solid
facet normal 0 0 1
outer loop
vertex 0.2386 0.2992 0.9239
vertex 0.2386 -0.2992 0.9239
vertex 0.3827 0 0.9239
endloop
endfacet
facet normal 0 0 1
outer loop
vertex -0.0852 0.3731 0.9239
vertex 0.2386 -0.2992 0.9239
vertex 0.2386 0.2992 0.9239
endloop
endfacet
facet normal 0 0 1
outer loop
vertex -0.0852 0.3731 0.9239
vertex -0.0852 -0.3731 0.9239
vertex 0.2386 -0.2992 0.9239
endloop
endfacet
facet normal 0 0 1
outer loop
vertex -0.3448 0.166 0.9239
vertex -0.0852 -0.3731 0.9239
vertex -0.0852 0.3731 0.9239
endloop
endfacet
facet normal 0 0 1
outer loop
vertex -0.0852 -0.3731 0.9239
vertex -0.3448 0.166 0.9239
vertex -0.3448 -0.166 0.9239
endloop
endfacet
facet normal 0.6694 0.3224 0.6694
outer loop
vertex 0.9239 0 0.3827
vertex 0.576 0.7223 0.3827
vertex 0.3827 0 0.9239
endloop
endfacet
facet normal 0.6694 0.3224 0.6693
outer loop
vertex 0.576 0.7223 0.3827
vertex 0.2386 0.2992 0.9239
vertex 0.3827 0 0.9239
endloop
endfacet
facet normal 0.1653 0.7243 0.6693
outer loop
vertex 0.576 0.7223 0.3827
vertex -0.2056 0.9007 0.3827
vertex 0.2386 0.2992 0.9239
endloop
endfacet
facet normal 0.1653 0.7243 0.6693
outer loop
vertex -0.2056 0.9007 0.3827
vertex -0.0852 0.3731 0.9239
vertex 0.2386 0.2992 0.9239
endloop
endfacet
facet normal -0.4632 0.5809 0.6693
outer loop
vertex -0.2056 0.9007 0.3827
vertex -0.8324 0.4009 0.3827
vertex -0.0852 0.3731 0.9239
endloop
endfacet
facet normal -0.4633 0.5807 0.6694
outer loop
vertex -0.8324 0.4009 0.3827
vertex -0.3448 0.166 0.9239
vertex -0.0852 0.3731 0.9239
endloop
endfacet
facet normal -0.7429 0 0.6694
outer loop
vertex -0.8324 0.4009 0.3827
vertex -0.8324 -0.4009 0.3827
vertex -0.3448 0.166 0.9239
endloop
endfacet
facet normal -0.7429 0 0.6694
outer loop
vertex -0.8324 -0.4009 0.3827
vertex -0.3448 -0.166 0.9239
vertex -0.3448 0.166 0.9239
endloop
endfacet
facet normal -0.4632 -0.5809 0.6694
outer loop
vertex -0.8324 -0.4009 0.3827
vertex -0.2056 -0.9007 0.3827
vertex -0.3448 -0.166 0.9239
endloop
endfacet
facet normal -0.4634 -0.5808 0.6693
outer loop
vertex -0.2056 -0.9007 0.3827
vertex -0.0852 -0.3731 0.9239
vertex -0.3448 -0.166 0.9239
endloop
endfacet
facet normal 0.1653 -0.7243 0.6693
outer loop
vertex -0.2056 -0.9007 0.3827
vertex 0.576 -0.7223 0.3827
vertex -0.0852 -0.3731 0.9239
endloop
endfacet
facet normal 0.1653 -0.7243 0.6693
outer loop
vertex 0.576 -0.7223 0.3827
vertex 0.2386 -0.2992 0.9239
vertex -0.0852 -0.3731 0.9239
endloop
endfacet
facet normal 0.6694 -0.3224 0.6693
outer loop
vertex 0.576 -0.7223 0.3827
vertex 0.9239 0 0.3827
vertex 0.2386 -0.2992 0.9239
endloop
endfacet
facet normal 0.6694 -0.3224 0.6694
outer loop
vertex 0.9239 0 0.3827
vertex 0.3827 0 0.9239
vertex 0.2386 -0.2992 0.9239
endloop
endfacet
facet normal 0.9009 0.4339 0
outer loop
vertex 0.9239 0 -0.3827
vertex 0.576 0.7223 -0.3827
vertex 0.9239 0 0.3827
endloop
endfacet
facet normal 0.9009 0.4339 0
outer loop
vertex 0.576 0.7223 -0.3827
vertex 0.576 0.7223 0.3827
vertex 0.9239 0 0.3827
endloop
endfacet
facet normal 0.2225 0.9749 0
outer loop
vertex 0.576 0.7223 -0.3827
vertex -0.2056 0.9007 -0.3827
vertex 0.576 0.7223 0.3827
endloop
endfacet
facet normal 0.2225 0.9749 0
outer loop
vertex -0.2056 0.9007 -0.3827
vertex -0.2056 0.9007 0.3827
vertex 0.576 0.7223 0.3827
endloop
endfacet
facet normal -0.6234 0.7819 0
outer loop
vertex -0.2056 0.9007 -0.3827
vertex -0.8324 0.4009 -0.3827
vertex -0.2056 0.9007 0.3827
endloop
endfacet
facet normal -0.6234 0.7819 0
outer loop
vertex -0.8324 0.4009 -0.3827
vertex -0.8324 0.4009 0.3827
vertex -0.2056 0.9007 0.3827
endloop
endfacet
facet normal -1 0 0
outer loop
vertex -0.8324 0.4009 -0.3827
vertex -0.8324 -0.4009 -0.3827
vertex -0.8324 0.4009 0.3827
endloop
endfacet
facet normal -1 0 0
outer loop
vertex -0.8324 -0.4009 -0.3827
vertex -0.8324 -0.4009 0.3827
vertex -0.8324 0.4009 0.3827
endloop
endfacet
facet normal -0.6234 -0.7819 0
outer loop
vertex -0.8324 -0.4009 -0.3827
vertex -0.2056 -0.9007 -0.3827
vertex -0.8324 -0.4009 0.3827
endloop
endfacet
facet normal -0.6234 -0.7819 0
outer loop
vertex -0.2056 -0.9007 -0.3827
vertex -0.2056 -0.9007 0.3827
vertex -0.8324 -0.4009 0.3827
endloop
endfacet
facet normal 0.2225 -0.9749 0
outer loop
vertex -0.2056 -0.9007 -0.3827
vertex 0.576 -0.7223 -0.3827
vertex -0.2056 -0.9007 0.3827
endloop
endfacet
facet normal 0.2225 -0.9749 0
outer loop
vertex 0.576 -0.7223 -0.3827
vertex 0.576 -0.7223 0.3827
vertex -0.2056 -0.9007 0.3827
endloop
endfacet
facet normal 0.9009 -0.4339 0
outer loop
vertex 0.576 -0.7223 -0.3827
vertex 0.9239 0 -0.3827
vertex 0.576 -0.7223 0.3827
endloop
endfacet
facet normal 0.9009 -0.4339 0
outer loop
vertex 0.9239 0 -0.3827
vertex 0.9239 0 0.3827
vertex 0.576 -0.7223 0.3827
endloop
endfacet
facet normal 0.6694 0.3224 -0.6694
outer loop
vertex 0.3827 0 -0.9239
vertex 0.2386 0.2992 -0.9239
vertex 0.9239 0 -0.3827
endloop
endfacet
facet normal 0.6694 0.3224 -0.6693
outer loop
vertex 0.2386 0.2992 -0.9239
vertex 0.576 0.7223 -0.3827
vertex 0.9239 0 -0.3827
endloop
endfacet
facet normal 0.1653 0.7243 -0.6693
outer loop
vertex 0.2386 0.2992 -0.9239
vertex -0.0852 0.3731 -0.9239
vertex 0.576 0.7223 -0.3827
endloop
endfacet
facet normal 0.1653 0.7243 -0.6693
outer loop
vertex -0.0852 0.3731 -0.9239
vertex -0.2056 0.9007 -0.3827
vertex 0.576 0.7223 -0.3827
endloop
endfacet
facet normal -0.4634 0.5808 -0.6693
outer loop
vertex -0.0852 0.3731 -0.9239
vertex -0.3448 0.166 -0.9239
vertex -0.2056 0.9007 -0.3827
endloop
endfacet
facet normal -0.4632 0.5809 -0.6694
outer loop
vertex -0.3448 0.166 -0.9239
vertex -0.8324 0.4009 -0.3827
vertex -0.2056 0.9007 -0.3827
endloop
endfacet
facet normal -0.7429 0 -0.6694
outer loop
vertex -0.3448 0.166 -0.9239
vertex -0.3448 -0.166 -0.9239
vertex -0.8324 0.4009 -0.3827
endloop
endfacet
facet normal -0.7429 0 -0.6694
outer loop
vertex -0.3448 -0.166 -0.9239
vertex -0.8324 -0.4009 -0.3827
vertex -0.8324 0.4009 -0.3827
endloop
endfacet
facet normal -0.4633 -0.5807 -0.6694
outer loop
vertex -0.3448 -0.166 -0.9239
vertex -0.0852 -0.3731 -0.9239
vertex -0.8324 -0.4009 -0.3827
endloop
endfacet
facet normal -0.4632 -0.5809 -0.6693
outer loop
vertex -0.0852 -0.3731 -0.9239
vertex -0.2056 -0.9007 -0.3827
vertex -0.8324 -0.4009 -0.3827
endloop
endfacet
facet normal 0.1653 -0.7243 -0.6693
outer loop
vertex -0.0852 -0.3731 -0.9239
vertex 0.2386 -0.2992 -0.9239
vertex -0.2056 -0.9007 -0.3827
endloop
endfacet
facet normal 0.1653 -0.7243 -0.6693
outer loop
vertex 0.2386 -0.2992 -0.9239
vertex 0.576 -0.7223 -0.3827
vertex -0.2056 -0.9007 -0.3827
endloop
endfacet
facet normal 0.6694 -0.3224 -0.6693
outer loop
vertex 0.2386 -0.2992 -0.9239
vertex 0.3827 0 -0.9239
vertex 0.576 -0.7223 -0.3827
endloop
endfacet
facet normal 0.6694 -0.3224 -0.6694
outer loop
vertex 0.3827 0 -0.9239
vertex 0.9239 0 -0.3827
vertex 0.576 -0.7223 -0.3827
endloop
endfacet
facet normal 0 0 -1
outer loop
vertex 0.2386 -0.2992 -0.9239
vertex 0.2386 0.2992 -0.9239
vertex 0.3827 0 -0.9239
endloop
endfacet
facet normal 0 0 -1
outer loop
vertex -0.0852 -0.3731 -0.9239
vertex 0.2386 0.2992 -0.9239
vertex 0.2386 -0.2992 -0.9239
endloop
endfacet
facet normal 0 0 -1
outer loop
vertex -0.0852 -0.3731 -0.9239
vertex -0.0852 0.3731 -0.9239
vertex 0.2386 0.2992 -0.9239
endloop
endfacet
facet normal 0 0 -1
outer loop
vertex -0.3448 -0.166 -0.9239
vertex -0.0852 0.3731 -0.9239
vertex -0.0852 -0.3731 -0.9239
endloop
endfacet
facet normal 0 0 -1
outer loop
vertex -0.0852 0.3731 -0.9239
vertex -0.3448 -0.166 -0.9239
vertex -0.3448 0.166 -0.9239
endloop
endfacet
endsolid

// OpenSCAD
$fn = 5;
module m() { echo("m $fn", $fn); children(); }
module n() { $fn = 7; m() sphere(); }
n();
m() { $fn = 9; echo("child", $fn); }
